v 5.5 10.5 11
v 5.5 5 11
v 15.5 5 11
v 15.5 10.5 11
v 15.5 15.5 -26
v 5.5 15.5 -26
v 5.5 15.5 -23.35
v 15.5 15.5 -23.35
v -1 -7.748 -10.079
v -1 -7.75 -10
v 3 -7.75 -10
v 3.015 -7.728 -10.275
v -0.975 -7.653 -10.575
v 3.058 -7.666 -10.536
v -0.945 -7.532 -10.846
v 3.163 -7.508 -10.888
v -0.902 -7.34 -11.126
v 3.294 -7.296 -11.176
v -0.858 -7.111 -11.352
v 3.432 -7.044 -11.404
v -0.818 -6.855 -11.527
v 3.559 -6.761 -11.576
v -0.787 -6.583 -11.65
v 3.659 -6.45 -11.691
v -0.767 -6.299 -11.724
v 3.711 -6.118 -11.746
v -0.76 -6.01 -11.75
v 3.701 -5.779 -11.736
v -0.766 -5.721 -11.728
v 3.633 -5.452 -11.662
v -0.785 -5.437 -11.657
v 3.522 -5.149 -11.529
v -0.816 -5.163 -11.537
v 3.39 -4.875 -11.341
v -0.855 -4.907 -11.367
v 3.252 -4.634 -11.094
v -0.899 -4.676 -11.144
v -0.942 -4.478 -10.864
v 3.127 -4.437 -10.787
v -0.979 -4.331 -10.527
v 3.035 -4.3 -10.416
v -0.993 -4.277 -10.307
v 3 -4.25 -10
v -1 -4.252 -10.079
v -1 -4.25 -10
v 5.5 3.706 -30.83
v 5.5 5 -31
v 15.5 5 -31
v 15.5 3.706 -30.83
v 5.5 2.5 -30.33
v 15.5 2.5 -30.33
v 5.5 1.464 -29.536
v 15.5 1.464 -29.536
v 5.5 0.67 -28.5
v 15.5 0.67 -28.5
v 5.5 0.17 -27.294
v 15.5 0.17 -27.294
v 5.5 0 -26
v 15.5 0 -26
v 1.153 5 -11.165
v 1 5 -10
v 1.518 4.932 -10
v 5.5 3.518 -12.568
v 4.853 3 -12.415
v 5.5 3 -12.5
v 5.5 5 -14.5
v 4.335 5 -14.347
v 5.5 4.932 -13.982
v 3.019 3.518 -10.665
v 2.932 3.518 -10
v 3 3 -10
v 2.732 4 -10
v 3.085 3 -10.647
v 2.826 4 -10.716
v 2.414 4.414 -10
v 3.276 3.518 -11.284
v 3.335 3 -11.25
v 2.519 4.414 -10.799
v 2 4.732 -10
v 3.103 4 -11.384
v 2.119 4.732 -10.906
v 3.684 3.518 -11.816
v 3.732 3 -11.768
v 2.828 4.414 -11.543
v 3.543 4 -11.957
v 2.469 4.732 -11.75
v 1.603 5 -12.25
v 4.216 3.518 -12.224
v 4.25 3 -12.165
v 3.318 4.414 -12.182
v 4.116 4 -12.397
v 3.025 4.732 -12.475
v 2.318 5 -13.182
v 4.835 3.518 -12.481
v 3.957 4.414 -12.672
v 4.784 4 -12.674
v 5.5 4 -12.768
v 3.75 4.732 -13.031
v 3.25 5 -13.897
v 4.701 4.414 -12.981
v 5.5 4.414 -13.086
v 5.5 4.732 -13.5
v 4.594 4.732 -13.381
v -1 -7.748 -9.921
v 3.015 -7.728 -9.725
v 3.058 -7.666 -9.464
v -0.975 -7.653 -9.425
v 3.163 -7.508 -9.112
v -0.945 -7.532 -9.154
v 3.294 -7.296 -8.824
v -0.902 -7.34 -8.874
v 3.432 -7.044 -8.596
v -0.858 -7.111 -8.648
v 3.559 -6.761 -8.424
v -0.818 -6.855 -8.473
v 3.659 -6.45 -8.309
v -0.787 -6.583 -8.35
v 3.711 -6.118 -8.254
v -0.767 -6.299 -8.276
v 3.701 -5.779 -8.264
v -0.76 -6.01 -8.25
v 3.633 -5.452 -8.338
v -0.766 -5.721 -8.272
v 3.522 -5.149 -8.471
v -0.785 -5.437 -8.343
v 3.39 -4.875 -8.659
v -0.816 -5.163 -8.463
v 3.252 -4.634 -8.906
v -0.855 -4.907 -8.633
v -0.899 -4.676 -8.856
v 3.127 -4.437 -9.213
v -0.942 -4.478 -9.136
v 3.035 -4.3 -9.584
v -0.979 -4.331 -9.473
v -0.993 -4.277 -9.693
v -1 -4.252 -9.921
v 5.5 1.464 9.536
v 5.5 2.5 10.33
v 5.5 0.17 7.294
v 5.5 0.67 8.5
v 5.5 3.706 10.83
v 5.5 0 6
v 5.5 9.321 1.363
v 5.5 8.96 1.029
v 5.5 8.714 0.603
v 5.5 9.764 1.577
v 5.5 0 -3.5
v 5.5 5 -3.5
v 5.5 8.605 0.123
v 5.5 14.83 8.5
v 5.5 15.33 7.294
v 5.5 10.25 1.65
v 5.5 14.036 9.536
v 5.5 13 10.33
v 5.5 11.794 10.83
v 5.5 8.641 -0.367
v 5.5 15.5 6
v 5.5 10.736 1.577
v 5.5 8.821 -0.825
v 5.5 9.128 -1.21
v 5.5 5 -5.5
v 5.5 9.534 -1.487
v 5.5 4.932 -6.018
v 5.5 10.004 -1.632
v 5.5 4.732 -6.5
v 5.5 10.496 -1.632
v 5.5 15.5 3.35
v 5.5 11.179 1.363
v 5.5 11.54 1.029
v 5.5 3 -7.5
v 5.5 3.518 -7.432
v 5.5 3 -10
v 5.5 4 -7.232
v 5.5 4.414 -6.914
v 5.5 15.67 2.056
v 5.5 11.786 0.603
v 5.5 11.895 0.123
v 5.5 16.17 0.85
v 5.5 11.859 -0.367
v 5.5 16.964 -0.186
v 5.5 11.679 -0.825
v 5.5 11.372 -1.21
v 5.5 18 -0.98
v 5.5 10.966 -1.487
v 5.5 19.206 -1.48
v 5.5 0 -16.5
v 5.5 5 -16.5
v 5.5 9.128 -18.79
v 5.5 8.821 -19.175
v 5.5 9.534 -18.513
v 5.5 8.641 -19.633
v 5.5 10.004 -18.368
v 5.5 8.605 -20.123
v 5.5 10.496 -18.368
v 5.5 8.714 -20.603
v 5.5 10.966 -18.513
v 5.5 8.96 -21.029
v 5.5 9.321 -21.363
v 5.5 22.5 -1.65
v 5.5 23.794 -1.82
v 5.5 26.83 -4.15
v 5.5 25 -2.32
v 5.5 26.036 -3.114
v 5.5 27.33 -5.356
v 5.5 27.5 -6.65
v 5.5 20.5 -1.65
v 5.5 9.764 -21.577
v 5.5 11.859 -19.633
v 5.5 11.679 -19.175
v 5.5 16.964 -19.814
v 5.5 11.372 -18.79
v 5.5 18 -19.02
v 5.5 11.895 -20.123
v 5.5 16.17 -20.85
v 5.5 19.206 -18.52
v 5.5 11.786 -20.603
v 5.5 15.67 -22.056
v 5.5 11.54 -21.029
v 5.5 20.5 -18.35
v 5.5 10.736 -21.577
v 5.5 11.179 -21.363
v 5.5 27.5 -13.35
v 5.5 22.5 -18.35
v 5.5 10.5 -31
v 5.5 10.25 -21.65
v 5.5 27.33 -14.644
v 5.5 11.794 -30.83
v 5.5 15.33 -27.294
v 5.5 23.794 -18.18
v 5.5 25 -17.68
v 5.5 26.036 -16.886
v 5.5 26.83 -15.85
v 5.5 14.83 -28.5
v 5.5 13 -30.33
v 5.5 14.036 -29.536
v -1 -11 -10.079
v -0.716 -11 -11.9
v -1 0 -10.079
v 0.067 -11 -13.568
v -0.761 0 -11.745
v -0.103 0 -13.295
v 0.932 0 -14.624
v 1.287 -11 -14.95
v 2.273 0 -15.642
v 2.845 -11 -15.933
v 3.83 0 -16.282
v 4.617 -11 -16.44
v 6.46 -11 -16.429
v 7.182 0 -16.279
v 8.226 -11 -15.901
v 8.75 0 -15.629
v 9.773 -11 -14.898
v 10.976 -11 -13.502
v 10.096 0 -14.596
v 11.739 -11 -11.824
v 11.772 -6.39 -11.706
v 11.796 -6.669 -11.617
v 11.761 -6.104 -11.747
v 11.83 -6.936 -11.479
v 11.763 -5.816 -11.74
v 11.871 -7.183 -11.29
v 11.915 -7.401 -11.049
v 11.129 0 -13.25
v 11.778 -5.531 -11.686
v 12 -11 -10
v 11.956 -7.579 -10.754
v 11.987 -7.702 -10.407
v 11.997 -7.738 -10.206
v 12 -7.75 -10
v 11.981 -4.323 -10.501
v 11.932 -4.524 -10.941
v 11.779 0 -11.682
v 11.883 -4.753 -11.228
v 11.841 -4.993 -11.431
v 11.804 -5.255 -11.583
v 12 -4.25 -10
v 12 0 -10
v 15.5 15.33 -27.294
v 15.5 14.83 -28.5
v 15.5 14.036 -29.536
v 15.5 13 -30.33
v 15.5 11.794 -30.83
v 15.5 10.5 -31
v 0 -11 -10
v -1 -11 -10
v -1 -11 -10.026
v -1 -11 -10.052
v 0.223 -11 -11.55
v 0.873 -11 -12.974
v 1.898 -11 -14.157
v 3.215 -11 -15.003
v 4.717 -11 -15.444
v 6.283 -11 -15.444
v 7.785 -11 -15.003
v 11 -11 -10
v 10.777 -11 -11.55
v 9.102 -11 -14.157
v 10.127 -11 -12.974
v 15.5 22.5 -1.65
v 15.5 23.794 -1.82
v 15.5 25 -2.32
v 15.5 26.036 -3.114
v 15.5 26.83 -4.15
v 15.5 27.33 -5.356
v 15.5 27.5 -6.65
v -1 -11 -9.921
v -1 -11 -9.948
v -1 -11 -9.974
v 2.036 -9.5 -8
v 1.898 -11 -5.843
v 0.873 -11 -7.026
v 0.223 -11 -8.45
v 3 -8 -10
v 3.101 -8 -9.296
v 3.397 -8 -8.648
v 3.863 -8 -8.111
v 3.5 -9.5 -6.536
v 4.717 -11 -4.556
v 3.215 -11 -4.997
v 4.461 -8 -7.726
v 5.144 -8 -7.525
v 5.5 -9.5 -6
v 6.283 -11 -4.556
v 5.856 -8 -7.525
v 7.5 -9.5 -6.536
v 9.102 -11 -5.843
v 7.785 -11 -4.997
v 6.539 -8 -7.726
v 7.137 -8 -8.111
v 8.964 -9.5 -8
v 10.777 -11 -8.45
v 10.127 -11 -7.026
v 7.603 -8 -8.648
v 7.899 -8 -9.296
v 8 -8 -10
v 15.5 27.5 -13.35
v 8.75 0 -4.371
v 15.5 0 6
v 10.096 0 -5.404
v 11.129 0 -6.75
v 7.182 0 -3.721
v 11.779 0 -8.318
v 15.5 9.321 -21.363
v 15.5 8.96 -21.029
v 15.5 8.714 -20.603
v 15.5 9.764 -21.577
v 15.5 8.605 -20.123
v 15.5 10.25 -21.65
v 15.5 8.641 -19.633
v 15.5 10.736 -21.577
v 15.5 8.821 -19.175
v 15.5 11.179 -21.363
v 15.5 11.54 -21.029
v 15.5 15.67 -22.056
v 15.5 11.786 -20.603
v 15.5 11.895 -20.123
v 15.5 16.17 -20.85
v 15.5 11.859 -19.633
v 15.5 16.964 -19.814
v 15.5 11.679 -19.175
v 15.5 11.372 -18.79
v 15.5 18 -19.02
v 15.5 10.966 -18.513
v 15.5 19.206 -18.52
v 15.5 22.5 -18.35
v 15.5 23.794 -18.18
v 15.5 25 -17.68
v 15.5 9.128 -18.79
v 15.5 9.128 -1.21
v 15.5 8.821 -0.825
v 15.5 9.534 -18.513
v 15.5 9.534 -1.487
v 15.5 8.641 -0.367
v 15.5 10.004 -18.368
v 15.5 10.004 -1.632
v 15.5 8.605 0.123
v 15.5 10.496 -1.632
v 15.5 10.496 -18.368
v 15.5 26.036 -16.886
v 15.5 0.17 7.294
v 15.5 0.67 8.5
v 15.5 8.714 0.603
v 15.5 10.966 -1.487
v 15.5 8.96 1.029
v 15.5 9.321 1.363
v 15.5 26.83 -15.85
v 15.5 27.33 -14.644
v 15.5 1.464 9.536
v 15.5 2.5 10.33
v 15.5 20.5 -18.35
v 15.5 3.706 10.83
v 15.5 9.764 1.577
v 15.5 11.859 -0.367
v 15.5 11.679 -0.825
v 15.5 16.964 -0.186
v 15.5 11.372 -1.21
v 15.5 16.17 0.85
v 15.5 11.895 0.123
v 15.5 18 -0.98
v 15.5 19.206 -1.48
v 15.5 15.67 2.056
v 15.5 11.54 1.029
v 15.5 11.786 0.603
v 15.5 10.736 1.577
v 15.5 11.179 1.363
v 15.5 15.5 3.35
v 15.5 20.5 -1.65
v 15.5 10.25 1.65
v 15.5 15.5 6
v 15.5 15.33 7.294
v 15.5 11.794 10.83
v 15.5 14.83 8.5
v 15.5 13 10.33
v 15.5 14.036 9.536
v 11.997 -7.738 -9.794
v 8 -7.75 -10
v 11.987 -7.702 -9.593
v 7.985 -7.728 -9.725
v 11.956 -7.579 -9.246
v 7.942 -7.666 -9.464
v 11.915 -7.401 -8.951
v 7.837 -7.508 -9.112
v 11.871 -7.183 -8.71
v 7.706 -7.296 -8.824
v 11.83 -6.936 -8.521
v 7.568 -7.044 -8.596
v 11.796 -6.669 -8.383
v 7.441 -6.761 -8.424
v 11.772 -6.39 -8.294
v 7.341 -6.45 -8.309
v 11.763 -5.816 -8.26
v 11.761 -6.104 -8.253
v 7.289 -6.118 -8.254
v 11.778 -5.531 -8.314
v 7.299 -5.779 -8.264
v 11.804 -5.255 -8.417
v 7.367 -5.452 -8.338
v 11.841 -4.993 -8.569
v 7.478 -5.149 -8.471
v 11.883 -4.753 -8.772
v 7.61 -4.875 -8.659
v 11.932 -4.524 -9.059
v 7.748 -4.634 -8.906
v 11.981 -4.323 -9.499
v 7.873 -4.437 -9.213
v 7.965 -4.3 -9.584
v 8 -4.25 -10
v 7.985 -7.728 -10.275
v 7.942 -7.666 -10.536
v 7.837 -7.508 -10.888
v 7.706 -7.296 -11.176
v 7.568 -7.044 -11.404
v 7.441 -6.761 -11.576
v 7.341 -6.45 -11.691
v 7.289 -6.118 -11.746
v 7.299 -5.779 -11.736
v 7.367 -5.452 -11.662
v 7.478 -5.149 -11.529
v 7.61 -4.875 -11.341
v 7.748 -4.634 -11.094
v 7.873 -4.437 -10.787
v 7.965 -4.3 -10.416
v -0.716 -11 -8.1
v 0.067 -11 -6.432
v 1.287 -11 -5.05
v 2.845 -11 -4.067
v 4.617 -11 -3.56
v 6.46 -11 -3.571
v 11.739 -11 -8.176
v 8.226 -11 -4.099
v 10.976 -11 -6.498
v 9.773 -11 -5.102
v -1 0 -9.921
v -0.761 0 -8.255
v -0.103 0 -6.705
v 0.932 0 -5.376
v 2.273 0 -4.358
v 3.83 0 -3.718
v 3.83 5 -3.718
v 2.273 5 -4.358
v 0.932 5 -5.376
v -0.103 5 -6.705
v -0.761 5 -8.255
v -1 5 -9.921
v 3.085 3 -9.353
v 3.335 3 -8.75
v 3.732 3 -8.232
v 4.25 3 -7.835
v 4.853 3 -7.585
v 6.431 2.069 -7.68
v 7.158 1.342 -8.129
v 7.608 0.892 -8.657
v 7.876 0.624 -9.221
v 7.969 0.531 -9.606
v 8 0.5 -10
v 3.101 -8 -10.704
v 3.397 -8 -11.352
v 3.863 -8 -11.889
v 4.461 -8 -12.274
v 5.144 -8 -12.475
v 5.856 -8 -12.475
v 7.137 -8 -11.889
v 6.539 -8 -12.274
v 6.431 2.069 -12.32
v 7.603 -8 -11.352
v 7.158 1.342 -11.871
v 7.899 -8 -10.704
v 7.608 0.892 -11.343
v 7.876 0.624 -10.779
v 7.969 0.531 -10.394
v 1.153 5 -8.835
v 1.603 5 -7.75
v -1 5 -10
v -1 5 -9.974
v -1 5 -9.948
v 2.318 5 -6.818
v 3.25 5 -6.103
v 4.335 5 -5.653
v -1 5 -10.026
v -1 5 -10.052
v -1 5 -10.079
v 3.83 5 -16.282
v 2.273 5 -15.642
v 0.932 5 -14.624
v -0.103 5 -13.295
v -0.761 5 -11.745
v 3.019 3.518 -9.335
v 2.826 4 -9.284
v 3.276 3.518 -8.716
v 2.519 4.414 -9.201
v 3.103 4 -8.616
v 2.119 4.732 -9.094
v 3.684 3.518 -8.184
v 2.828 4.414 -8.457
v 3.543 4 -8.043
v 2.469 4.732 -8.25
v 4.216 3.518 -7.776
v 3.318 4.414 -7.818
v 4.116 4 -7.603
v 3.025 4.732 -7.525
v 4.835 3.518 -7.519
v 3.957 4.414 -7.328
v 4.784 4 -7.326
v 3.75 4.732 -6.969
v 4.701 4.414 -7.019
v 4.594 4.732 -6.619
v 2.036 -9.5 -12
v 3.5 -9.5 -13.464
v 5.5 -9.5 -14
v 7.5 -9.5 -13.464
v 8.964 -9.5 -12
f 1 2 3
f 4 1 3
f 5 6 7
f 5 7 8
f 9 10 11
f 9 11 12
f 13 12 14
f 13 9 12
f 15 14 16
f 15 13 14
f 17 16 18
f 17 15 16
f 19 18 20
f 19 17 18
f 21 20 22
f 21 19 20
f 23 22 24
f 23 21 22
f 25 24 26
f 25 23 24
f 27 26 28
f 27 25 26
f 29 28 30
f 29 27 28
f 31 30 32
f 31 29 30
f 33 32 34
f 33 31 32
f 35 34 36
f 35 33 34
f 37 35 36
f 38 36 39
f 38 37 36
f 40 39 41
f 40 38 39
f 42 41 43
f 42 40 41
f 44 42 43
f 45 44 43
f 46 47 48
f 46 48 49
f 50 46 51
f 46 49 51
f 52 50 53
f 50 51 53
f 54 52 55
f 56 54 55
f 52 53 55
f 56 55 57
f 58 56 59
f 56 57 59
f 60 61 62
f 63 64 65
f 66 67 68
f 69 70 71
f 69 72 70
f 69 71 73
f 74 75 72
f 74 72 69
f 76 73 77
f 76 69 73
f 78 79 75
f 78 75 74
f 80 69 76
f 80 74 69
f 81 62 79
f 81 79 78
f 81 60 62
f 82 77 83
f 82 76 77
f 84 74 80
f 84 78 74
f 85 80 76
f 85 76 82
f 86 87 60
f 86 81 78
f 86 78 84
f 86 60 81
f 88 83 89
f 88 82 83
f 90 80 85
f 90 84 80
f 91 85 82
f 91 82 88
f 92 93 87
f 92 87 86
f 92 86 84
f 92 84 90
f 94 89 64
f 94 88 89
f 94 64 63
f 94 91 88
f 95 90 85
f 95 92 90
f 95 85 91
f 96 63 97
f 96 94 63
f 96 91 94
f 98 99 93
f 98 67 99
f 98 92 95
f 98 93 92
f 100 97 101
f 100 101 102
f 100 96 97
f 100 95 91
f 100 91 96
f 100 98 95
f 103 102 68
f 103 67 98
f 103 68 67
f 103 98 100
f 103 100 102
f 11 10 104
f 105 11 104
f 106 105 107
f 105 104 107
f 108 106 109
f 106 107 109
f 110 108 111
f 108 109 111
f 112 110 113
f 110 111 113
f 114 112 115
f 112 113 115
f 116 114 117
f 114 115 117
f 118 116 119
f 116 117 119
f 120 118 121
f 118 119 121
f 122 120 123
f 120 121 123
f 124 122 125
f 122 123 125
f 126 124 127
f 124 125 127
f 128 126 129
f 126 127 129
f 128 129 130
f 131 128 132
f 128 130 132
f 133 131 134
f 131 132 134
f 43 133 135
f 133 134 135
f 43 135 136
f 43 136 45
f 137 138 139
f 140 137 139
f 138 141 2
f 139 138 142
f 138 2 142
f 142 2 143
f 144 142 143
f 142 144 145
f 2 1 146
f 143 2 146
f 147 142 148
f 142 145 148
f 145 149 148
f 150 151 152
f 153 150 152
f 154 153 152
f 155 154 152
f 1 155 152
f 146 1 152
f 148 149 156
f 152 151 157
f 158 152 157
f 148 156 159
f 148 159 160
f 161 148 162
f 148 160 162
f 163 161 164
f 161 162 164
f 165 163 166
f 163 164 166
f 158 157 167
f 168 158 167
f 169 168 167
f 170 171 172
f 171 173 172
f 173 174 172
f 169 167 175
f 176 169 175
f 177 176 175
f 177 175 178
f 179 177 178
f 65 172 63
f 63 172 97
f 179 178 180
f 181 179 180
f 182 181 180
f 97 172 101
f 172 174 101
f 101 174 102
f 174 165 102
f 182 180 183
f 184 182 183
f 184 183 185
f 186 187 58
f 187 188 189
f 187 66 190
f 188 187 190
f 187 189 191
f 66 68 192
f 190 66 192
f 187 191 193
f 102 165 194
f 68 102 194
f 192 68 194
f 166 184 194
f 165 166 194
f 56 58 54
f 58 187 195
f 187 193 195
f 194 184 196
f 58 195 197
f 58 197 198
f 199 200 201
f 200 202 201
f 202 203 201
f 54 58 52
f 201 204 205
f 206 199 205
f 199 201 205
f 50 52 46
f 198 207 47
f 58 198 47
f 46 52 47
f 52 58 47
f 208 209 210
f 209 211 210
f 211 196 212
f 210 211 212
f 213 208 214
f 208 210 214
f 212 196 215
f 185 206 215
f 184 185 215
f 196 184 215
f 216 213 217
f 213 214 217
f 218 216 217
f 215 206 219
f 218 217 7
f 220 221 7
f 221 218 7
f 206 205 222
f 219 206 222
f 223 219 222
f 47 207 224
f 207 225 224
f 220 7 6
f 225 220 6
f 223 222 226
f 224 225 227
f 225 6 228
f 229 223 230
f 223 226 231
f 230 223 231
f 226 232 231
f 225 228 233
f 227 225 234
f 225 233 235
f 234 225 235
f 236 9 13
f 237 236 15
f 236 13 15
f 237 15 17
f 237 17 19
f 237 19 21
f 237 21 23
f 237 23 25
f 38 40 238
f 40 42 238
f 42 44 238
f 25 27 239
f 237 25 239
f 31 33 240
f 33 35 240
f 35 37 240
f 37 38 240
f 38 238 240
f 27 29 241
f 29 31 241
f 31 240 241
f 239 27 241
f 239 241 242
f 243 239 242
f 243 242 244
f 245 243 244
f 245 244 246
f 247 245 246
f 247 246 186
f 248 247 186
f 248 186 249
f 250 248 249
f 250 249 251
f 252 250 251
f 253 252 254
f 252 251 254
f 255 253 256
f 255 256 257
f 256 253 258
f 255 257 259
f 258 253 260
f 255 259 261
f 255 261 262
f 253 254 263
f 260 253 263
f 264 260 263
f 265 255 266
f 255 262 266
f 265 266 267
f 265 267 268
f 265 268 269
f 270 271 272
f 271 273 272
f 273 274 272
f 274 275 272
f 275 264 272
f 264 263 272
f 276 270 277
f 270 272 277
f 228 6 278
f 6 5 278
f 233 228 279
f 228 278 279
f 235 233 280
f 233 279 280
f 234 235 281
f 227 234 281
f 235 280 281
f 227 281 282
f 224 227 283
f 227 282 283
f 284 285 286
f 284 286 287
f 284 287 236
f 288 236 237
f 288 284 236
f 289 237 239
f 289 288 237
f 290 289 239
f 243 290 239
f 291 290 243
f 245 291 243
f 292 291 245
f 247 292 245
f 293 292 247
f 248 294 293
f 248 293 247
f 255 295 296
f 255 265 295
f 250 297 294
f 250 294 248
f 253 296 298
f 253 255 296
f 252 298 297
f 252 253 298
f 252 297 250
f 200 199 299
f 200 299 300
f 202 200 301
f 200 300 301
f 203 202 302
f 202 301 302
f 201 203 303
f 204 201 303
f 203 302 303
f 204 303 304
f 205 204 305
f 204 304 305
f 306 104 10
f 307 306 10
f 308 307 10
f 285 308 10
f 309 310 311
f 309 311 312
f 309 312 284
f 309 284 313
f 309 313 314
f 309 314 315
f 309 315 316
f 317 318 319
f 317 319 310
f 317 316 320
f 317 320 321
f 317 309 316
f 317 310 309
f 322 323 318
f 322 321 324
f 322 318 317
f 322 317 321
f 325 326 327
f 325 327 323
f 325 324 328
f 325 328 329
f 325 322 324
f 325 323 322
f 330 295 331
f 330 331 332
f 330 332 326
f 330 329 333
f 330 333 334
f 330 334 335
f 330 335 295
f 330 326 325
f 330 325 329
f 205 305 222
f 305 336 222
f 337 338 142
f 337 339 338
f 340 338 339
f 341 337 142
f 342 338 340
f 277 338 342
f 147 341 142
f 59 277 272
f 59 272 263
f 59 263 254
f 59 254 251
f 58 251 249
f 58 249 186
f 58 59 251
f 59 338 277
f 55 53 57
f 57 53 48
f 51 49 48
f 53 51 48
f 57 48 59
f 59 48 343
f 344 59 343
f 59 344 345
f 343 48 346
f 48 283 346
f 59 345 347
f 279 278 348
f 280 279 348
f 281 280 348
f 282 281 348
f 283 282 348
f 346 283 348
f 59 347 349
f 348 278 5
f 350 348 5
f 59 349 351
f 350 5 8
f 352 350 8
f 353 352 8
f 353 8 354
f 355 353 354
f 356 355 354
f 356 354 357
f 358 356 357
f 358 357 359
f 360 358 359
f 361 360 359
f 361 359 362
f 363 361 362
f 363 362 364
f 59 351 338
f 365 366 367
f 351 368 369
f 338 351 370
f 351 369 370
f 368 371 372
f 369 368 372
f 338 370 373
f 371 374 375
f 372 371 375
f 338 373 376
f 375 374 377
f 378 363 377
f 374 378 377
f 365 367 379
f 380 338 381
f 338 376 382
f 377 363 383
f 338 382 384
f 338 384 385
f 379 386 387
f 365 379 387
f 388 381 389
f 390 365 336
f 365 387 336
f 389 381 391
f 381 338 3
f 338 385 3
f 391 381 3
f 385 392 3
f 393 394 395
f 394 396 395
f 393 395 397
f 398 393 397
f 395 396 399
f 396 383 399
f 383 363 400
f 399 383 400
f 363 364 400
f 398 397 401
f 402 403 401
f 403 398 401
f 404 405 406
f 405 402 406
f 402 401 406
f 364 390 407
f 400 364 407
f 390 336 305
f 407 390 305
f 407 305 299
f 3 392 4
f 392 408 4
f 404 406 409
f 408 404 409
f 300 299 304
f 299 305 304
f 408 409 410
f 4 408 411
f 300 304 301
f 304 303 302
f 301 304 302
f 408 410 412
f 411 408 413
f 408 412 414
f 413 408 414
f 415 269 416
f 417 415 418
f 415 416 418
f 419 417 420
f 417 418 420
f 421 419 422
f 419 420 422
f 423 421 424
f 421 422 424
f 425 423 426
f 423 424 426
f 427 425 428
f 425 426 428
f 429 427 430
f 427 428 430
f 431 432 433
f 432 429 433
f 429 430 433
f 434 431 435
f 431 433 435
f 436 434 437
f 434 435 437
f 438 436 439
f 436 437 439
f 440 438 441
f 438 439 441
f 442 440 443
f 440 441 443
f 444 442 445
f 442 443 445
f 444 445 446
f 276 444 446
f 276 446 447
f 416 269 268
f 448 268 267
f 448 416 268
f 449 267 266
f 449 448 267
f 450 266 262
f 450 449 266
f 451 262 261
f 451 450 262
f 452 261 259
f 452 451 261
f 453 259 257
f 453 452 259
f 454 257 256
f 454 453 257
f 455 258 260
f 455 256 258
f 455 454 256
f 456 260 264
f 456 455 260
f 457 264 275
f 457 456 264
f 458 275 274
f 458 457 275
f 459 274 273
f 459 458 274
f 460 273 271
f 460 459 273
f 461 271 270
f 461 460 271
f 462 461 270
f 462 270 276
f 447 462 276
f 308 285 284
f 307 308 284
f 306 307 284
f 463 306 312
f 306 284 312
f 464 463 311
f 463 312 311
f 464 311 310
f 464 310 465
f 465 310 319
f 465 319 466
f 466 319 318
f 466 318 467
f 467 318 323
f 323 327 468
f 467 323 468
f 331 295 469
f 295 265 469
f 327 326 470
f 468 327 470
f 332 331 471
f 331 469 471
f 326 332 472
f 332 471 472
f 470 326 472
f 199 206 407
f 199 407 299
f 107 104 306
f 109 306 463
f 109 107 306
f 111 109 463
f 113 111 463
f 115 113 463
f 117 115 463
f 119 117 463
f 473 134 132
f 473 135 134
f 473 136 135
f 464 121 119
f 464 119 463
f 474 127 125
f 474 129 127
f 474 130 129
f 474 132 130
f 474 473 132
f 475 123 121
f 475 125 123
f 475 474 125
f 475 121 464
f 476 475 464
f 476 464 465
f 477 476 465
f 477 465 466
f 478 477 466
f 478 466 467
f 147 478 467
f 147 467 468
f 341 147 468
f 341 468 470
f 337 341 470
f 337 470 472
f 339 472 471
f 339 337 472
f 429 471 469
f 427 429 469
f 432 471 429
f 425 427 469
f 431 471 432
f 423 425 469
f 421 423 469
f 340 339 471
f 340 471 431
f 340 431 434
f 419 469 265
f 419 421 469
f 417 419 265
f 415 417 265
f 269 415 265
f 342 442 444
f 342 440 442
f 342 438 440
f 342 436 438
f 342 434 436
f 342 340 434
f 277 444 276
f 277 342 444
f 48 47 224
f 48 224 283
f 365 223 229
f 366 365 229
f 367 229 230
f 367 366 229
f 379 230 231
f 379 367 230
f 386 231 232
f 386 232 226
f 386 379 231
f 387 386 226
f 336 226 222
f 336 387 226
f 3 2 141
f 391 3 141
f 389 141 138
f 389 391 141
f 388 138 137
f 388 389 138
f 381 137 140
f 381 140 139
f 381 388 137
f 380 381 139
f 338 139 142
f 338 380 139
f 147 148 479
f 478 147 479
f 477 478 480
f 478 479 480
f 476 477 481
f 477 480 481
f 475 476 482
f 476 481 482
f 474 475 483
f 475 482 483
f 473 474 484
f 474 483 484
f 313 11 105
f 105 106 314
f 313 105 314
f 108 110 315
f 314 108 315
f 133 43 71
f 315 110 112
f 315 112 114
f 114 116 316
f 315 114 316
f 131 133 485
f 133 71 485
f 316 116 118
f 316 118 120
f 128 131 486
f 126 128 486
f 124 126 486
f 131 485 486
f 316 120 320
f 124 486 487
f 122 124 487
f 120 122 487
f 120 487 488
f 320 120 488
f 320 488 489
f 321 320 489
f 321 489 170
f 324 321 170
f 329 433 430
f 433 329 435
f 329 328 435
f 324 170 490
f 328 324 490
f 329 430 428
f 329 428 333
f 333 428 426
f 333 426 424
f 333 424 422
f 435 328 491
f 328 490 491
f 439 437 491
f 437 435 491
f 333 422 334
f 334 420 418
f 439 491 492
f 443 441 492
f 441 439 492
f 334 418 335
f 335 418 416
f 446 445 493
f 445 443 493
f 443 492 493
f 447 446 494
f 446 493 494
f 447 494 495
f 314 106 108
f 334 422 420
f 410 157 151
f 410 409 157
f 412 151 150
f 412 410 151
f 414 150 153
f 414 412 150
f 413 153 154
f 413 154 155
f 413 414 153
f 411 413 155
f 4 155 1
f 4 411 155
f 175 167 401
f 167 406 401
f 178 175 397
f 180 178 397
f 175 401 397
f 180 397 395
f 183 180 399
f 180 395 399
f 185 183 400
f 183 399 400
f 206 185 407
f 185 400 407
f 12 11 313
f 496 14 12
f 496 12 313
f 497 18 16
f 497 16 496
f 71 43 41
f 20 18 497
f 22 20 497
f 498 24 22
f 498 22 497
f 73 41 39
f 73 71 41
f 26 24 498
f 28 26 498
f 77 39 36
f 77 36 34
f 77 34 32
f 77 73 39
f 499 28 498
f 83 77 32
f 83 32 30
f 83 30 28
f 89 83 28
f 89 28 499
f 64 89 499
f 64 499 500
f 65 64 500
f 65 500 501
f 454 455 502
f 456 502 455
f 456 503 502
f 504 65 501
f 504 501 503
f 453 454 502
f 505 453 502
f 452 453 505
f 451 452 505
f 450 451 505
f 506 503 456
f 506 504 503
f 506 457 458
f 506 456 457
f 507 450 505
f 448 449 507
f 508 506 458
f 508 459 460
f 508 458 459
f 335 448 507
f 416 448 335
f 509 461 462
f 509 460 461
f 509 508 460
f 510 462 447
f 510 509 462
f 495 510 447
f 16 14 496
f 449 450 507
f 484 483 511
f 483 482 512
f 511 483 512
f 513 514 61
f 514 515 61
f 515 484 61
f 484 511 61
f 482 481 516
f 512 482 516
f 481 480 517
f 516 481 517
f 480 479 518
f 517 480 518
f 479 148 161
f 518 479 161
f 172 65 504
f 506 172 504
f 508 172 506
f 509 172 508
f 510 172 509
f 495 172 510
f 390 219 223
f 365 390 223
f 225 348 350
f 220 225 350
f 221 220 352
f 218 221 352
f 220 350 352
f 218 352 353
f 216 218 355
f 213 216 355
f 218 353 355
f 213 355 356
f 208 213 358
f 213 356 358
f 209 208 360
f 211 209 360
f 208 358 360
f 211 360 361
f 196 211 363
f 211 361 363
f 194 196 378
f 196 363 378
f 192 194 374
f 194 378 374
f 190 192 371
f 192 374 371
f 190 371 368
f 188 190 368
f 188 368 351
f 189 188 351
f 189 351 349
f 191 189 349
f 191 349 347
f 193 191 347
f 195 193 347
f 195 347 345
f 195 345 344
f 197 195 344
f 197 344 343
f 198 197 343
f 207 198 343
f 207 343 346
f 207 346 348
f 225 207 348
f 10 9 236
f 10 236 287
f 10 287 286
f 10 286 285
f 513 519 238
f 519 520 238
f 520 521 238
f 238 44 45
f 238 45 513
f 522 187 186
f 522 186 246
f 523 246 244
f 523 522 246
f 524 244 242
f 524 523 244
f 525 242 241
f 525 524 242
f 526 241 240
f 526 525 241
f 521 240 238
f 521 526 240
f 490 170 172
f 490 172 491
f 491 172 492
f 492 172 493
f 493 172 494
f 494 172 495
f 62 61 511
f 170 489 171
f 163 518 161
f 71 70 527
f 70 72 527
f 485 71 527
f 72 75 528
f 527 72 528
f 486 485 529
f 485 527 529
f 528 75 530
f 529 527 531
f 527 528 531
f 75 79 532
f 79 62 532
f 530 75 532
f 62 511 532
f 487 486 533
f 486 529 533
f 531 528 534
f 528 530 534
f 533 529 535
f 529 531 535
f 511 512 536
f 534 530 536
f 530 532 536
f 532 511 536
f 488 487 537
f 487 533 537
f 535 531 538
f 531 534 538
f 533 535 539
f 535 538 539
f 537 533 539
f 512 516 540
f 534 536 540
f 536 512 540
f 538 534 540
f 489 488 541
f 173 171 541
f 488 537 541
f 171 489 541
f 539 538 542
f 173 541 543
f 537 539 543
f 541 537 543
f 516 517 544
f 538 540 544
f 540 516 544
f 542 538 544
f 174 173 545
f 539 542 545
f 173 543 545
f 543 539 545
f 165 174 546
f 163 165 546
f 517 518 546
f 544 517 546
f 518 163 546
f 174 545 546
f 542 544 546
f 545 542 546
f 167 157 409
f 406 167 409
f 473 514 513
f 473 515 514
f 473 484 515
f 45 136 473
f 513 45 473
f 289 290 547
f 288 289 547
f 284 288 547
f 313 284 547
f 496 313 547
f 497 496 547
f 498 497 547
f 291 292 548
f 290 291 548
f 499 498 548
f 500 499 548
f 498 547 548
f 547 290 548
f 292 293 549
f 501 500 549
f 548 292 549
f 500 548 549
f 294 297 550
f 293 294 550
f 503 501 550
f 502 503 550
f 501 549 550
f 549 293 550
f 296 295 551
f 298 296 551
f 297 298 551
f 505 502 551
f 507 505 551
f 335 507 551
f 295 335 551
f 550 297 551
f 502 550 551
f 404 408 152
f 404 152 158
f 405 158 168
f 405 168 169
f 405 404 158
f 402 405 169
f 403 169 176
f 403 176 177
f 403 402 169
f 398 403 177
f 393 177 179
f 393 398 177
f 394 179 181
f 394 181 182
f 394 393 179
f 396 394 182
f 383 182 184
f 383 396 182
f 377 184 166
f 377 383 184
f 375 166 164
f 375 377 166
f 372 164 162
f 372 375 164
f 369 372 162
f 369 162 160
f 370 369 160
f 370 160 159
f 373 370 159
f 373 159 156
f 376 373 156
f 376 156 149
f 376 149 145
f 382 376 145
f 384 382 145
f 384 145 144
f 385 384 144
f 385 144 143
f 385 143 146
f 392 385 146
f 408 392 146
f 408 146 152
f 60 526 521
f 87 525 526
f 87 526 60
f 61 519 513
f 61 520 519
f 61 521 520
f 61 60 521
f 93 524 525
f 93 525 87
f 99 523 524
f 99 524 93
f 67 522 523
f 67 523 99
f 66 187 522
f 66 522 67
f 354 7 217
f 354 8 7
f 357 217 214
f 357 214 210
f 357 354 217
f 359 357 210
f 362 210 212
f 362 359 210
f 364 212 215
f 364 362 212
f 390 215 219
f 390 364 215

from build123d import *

# Parameters (mm, degrees)
SKETCH1_R               = 1.75
BOSS_EXTRUDE1_DEPTH     = 5
SKETCH2_W               = 10
SKETCH2_H               = 36
BOSS_EXTRUDE2_DEPTH     = 10.5
SKETCH3_R               = 1.75
BOSS_EXTRUDE3_DEPTH     = 5
FILLET1_R               = 5
SKETCH4_R               = 1.65
CUT_EXTRUDE1_DEPTH      = 43.444080859
SKETCH5_R               = 6.5
SKETCH5_R_2             = 2.5
BOSS_EXTRUDE4_DEPTH     = 11
BOSS_EXTRUDE5_START     = 5
BOSS_EXTRUDE5_DEPTH     = 5
CUT_EXTRUDE2_DEPTH      = 41.267853183
CUT_EXTRUDE2_DEPTH_BACK = 41.267853183
SKETCH7_R               = 1.75
FILLET2_R               = 5
FILLET3_R               = 5
SKETCH9_W               = 13.35
SKETCH9_H               = 12
BOSS_EXTRUDE6_DEPTH     = 10
CHAMFER2_SIZE           = 3
CHAMFER3_SIZE           = 3
FILLET6_R               = 2
SKETCH14_R              = 1.75
BOSS_EXTRUDE9_DEPTH     = 7
FILLET7_R               = 10
CUT_EXTRUDE7_DEPTH      = 52.802509666
CUT_EXTRUDE7_DEPTH_BACK = 52.802509666
CUT_EXTRUDE8_START      = -12
CUT_EXTRUDE8_DEPTH      = 12
SKETCH19_W              = 10
SKETCH19_H              = 15.5
BOSS_EXTRUDE10_DEPTH    = 10
BOSS_EXTRUDE11_START    = -27.5
BOSS_EXTRUDE11_DEPTH    = 27.5
CUT_EXTRUDE9_DEPTH      = 25
FILLET10_R              = 5


# Read off the part's stored shape, not the designer's step: Cut-Extrude8, Cut-Extrude9
with BuildPart() as part:
    # Sketch1 → Boss-Extrude1 (new body)
    with BuildSketch(Plane(origin=(0, 0, 0), x_dir=(1, 0, 0), z_dir=(0, 1, 0))):
        with BuildLine():
            Line((0, 5), (5.5, 5))
            Line((5.5, 5), (5.5, 31))
            Line((5.5, 31), (15.5, 31))
            Line((15.5, 31), (15.5, -5))
            Line((15.5, -5), (5.5, -5))
            Line((5.5, -5), (0, -5))
            ThreePointArc((0, -5), (-5, 0), (0, 5))
        make_face()
        with Locations(Location((0, 0, 0), (0, 0, 270))):
            Circle(SKETCH1_R, mode=Mode.SUBTRACT)
    extrude(amount=BOSS_EXTRUDE1_DEPTH)

    # Sketch2 → Boss-Extrude2 (add)
    with BuildSketch(Plane(origin=(0, 5, 0), x_dir=(1, 0, 0), z_dir=(0, 1, 0))):
        with Locations((10.5, 13)):
            Rectangle(SKETCH2_W, SKETCH2_H)
    extrude(amount=BOSS_EXTRUDE2_DEPTH)

    # Sketch3 → Boss-Extrude3 (add)
    with BuildSketch(Plane(origin=(0, 15.5, 0), x_dir=(1, 0, 0), z_dir=(0, 1, 0))):
        with BuildLine():
            Line((5.5, 5), (15.5, 5))
            Line((15.5, 5), (15.5, -5))
            Line((15.5, -5), (5.5, -5))
            Line((5.5, -5), (0, -5))
            ThreePointArc((0, -5), (-5, 0), (0, 5))
            Line((0, 5), (5.5, 5))
        make_face()
        with Locations(Location((0, 0, 0), (0, 0, 270))):
            Circle(SKETCH3_R, mode=Mode.SUBTRACT)
    extrude(amount=BOSS_EXTRUDE3_DEPTH)

    # Fillet1
    fillet1_edges = [part.edges().sort_by_distance(p)[0] for p in [
        (15.5, 10.25, 5),
    ]]
    fillet(fillet1_edges, radius=FILLET1_R)

    # Sketch4 → Cut-Extrude1 (cut, through all)
    with BuildSketch(Plane(origin=(15.5, 0, 0), x_dir=(0, 0, -1), z_dir=(1, 0, 0))):
        with Locations((20, 10.25)):
            Circle(SKETCH4_R)
    extrude(amount=-CUT_EXTRUDE1_DEPTH, mode=Mode.SUBTRACT)

    # Sketch5 → Boss-Extrude4 (add)
    with BuildSketch(Plane.XZ):
        with Locations(Location((5.5, -10, 0), (0, 0, 270))):
            Circle(SKETCH5_R)
        with Locations(Location((5.5, -10, 0), (0, 0, 270))):
            Circle(SKETCH5_R_2, mode=Mode.SUBTRACT)
    extrude(amount=BOSS_EXTRUDE4_DEPTH)

    # Sketch6 → Boss-Extrude5 (add)
    with BuildSketch(Plane(origin=(0, 0, 0), x_dir=(1, 0, 0), z_dir=(0, 1, 0)).offset(BOSS_EXTRUDE5_START)):
        with BuildLine():
            Line((5.5, 12.5), (5.5, 16.5))
            ThreePointArc((5.5, 16.5), (-0.61350963, 12.207940217), (1.346688069, 5))
            Line((1.346688069, 5), (5.5, 5))
            Line((5.5, 5), (5.5, 7.5))
            ThreePointArc((5.5, 7.5), (3, 10), (5.5, 12.5))
        make_face()
    extrude(amount=-BOSS_EXTRUDE5_DEPTH)

    # Sketch7 → Cut-Extrude2 (cut, two sides: drawn at the far end of the back side and taken through both)
    with BuildSketch(Plane(origin=(0, 0, 0), x_dir=(0, 0, -1), z_dir=(1, 0, 0)).offset(-CUT_EXTRUDE2_DEPTH_BACK)):
        with Locations((10, -6)):
            Circle(SKETCH7_R)
    extrude(amount=CUT_EXTRUDE2_DEPTH + CUT_EXTRUDE2_DEPTH_BACK, mode=Mode.SUBTRACT)

    # Fillet2
    fillet2_edges = [part.edges().sort_by_distance(p)[0] for p in [
        (10.5, 15.5, -31),
        (10.5, 0, -31),
    ]]
    fillet(fillet2_edges, radius=FILLET2_R)

    # Fillet3
    # the kernel refuses this fillet: 5 mm, written as the material it adds along each edge
    with BuildSketch(Plane(origin=(15.5, 15.5, -5), x_dir=(0, 0, -1), z_dir=(-1, 0, 0))) as fillet3_piece_1:
        with BuildLine():
            CenterArc((FILLET3_R, -FILLET3_R), FILLET3_R, 90, 90)
            Line((0, -FILLET3_R), (0, 0))
            Line((0, 0), (FILLET3_R, 0))
        make_face()
    extrude(amount=10)

    # Sketch9 → Boss-Extrude6 (add)
    with BuildSketch(Plane.ZY.offset(-5.5)):
        with Locations((-11.675, 21.5)):
            Rectangle(SKETCH9_W, SKETCH9_H)
    extrude(amount=-BOSS_EXTRUDE6_DEPTH)

    # Chamfer2
    chamfer2_edges = [part.edges().sort_by_distance(p)[0] for p in [
        (5.5, -11, -7.5),
    ]]
    chamfer(chamfer2_edges, length=CHAMFER2_SIZE)

    # Chamfer3
    # the kernel refuses this chamfer: 3 mm, written as the material it takes off along each edge
    with BuildSketch(Plane(origin=(5.5, 0, 0.215048964), x_dir=(-0.02749587661058649, 0.9996219169112968, 0), z_dir=(0, 0, -1))) as chamfer3_piece_1_section:
        Polygon((CHAMFER3_SIZE * 0.999621916911, CHAMFER3_SIZE * 0.0274958766106), (-CHAMFER3_SIZE * 0.0274958766106, CHAMFER3_SIZE * 0.999621916911), (0, 0), align=None)
    chamfer3_piece_1 = extrude(amount=20.430097928, mode=Mode.PRIVATE)
    chamfer3_piece_1 = chamfer3_piece_1 & Plane(origin=(5.5, 1.082097371, -10), x_dir=(0, 0, 1), z_dir=(0, 1, 0)) * Cylinder(2.5, 53, mode=Mode.PRIVATE)
    add(chamfer3_piece_1, mode=Mode.SUBTRACT)

    # Fillet6
    fillet6_edges = [part.edges().sort_by_distance(p)[0] for p in [
        (3, 5, -10),
    ]]
    fillet(fillet6_edges, radius=FILLET6_R)

    # Sketch14 → Boss-Extrude9 (add)
    with BuildSketch(Plane(origin=(0, 20.5, 0), x_dir=(1, 0, 0), z_dir=(0, 1, 0))):
        with BuildLine():
            Line((0, -5), (10.5, -5))
            ThreePointArc((10.5, -5), (14.035533906, -3.535533906), (15.5, 0))
            Line((15.5, 0), (15.5, 5))
            Line((15.5, 5), (5.5, 5))
            Line((5.5, 5), (0, 5))
            ThreePointArc((0, 5), (-5, 0), (0, -5))
        make_face()
        with Locations(Location((0, 0, 0), (0, 0, 270))):
            Circle(SKETCH14_R, mode=Mode.SUBTRACT)
    extrude(amount=BOSS_EXTRUDE9_DEPTH)

    # Fillet7
    # the kernel refuses this fillet: 10 mm, written as the material it adds along each edge
    with BuildSketch(Plane(origin=(1.346688069, 5, -5), x_dir=(-0.41939386698079784, 0, -0.9078043755891976), z_dir=(0, -1, 0))) as fillet7_piece_1:
        with BuildLine():
            CenterArc((9.89760177, -9.026713968), FILLET7_R, 115.488537073, 42.147981554)
            Line((0.649714482, -5.22190376), (-0.275074246, -4.841422739))
            ThreePointArc((-0.275074246, -4.841422739), (-0.343011659, -1.641923188), (-0.907804376, -0.419393867))
            Line((-0.907804376, -0.419393867), (0.430330512, 0.902671397))
            ThreePointArc((0.430330512, 0.902671397), (2.797148326, 0.367364079), (5.163966141, 0.902671397))
            Line((5.163966141, 0.902671397), (5.594296652, 0))
        make_face()
    extrude(amount=5)

    # Sketch17 → Cut-Extrude7 (cut, two sides: drawn at the far end of the back side and taken through both)
    with BuildSketch(Plane(origin=(0, 27.5, 0), x_dir=(1, 0, 0), z_dir=(0, 1, 0)).offset(-CUT_EXTRUDE7_DEPTH_BACK)):
        with BuildLine():
            Line((5.5, 3.5), (5.5, -5))
            Line((5.5, -5), (0, -5))
            ThreePointArc((0, -5), (-4.582515477, -2.000137971), (-3.666265283, 3.399779239))
            ThreePointArc((-3.666265283, 3.399779239), (-1.711748558, 6.491136994), (-0.999525638, 10.078526979))
            ThreePointArc((-0.999525638, 10.078526979), (0.876125793, 5.431653766), (5.5, 3.5))
        make_face()
    extrude(amount=CUT_EXTRUDE7_DEPTH + CUT_EXTRUDE7_DEPTH_BACK, mode=Mode.SUBTRACT)

    # Cut-Extrude8 outline → Cut-Extrude8 (cut)
    with BuildSketch(Plane.XZ.offset(-15.5).offset(CUT_EXTRUDE8_START)):
        with BuildLine():
            Line((1.346688069, -5), (5.5, -5))
            Line((5.5, -5), (5.5, -3.5))
            ThreePointArc((5.5, -3.5), (3.292059784, -3.88649037), (1.346688069, -5))
        make_face()
    extrude(amount=CUT_EXTRUDE8_DEPTH, mode=Mode.SUBTRACT)

    # Sketch19 → Boss-Extrude10 (add)
    with BuildSketch(Plane.ZY.offset(-5.5)):
        with Locations((10, 7.75)):
            Rectangle(SKETCH19_W, SKETCH19_H)
    extrude(amount=-BOSS_EXTRUDE10_DEPTH)

    # Sketch20 → Boss-Extrude11 (add)
    with BuildSketch(Plane.XZ.offset(BOSS_EXTRUDE11_START)):
        with BuildLine():
            Line((15.5, 5), (15.5, 0))
            ThreePointArc((15.5, 0), (14.035533906, 3.535533906), (10.5, 5))
            Line((10.5, 5), (15.5, 5))
        make_face()
    extrude(amount=BOSS_EXTRUDE11_DEPTH)

    # Cut-Extrude9 outline → Cut-Extrude9 (cut)
    with BuildSketch(Plane(origin=(0, 0, -10), x_dir=(0, 1, 0), z_dir=(0, 0, 1))):
        Polygon((5, 1), (-11, 1), (-11, -15.5), (27.5, -15.5), (27.5, -5.5), (5, -5.5), align=None)
    extrude(amount=CUT_EXTRUDE9_DEPTH, mode=Mode.SUBTRACT)

    # Fillet10
    fillet10_edges = [part.edges().sort_by_distance(p)[0] for p in [
        (10.5, 15.5, -18.35),
        (10.5, 27.5, -18.35),
    ]]
    fillet(fillet10_edges, radius=FILLET10_R)

    # Mirror1: part across plane


with BuildPart() as part_1:
    add(part.part)
    add(part.part.mirror(Plane.XY.offset(-10)))


solid = part_1.part
